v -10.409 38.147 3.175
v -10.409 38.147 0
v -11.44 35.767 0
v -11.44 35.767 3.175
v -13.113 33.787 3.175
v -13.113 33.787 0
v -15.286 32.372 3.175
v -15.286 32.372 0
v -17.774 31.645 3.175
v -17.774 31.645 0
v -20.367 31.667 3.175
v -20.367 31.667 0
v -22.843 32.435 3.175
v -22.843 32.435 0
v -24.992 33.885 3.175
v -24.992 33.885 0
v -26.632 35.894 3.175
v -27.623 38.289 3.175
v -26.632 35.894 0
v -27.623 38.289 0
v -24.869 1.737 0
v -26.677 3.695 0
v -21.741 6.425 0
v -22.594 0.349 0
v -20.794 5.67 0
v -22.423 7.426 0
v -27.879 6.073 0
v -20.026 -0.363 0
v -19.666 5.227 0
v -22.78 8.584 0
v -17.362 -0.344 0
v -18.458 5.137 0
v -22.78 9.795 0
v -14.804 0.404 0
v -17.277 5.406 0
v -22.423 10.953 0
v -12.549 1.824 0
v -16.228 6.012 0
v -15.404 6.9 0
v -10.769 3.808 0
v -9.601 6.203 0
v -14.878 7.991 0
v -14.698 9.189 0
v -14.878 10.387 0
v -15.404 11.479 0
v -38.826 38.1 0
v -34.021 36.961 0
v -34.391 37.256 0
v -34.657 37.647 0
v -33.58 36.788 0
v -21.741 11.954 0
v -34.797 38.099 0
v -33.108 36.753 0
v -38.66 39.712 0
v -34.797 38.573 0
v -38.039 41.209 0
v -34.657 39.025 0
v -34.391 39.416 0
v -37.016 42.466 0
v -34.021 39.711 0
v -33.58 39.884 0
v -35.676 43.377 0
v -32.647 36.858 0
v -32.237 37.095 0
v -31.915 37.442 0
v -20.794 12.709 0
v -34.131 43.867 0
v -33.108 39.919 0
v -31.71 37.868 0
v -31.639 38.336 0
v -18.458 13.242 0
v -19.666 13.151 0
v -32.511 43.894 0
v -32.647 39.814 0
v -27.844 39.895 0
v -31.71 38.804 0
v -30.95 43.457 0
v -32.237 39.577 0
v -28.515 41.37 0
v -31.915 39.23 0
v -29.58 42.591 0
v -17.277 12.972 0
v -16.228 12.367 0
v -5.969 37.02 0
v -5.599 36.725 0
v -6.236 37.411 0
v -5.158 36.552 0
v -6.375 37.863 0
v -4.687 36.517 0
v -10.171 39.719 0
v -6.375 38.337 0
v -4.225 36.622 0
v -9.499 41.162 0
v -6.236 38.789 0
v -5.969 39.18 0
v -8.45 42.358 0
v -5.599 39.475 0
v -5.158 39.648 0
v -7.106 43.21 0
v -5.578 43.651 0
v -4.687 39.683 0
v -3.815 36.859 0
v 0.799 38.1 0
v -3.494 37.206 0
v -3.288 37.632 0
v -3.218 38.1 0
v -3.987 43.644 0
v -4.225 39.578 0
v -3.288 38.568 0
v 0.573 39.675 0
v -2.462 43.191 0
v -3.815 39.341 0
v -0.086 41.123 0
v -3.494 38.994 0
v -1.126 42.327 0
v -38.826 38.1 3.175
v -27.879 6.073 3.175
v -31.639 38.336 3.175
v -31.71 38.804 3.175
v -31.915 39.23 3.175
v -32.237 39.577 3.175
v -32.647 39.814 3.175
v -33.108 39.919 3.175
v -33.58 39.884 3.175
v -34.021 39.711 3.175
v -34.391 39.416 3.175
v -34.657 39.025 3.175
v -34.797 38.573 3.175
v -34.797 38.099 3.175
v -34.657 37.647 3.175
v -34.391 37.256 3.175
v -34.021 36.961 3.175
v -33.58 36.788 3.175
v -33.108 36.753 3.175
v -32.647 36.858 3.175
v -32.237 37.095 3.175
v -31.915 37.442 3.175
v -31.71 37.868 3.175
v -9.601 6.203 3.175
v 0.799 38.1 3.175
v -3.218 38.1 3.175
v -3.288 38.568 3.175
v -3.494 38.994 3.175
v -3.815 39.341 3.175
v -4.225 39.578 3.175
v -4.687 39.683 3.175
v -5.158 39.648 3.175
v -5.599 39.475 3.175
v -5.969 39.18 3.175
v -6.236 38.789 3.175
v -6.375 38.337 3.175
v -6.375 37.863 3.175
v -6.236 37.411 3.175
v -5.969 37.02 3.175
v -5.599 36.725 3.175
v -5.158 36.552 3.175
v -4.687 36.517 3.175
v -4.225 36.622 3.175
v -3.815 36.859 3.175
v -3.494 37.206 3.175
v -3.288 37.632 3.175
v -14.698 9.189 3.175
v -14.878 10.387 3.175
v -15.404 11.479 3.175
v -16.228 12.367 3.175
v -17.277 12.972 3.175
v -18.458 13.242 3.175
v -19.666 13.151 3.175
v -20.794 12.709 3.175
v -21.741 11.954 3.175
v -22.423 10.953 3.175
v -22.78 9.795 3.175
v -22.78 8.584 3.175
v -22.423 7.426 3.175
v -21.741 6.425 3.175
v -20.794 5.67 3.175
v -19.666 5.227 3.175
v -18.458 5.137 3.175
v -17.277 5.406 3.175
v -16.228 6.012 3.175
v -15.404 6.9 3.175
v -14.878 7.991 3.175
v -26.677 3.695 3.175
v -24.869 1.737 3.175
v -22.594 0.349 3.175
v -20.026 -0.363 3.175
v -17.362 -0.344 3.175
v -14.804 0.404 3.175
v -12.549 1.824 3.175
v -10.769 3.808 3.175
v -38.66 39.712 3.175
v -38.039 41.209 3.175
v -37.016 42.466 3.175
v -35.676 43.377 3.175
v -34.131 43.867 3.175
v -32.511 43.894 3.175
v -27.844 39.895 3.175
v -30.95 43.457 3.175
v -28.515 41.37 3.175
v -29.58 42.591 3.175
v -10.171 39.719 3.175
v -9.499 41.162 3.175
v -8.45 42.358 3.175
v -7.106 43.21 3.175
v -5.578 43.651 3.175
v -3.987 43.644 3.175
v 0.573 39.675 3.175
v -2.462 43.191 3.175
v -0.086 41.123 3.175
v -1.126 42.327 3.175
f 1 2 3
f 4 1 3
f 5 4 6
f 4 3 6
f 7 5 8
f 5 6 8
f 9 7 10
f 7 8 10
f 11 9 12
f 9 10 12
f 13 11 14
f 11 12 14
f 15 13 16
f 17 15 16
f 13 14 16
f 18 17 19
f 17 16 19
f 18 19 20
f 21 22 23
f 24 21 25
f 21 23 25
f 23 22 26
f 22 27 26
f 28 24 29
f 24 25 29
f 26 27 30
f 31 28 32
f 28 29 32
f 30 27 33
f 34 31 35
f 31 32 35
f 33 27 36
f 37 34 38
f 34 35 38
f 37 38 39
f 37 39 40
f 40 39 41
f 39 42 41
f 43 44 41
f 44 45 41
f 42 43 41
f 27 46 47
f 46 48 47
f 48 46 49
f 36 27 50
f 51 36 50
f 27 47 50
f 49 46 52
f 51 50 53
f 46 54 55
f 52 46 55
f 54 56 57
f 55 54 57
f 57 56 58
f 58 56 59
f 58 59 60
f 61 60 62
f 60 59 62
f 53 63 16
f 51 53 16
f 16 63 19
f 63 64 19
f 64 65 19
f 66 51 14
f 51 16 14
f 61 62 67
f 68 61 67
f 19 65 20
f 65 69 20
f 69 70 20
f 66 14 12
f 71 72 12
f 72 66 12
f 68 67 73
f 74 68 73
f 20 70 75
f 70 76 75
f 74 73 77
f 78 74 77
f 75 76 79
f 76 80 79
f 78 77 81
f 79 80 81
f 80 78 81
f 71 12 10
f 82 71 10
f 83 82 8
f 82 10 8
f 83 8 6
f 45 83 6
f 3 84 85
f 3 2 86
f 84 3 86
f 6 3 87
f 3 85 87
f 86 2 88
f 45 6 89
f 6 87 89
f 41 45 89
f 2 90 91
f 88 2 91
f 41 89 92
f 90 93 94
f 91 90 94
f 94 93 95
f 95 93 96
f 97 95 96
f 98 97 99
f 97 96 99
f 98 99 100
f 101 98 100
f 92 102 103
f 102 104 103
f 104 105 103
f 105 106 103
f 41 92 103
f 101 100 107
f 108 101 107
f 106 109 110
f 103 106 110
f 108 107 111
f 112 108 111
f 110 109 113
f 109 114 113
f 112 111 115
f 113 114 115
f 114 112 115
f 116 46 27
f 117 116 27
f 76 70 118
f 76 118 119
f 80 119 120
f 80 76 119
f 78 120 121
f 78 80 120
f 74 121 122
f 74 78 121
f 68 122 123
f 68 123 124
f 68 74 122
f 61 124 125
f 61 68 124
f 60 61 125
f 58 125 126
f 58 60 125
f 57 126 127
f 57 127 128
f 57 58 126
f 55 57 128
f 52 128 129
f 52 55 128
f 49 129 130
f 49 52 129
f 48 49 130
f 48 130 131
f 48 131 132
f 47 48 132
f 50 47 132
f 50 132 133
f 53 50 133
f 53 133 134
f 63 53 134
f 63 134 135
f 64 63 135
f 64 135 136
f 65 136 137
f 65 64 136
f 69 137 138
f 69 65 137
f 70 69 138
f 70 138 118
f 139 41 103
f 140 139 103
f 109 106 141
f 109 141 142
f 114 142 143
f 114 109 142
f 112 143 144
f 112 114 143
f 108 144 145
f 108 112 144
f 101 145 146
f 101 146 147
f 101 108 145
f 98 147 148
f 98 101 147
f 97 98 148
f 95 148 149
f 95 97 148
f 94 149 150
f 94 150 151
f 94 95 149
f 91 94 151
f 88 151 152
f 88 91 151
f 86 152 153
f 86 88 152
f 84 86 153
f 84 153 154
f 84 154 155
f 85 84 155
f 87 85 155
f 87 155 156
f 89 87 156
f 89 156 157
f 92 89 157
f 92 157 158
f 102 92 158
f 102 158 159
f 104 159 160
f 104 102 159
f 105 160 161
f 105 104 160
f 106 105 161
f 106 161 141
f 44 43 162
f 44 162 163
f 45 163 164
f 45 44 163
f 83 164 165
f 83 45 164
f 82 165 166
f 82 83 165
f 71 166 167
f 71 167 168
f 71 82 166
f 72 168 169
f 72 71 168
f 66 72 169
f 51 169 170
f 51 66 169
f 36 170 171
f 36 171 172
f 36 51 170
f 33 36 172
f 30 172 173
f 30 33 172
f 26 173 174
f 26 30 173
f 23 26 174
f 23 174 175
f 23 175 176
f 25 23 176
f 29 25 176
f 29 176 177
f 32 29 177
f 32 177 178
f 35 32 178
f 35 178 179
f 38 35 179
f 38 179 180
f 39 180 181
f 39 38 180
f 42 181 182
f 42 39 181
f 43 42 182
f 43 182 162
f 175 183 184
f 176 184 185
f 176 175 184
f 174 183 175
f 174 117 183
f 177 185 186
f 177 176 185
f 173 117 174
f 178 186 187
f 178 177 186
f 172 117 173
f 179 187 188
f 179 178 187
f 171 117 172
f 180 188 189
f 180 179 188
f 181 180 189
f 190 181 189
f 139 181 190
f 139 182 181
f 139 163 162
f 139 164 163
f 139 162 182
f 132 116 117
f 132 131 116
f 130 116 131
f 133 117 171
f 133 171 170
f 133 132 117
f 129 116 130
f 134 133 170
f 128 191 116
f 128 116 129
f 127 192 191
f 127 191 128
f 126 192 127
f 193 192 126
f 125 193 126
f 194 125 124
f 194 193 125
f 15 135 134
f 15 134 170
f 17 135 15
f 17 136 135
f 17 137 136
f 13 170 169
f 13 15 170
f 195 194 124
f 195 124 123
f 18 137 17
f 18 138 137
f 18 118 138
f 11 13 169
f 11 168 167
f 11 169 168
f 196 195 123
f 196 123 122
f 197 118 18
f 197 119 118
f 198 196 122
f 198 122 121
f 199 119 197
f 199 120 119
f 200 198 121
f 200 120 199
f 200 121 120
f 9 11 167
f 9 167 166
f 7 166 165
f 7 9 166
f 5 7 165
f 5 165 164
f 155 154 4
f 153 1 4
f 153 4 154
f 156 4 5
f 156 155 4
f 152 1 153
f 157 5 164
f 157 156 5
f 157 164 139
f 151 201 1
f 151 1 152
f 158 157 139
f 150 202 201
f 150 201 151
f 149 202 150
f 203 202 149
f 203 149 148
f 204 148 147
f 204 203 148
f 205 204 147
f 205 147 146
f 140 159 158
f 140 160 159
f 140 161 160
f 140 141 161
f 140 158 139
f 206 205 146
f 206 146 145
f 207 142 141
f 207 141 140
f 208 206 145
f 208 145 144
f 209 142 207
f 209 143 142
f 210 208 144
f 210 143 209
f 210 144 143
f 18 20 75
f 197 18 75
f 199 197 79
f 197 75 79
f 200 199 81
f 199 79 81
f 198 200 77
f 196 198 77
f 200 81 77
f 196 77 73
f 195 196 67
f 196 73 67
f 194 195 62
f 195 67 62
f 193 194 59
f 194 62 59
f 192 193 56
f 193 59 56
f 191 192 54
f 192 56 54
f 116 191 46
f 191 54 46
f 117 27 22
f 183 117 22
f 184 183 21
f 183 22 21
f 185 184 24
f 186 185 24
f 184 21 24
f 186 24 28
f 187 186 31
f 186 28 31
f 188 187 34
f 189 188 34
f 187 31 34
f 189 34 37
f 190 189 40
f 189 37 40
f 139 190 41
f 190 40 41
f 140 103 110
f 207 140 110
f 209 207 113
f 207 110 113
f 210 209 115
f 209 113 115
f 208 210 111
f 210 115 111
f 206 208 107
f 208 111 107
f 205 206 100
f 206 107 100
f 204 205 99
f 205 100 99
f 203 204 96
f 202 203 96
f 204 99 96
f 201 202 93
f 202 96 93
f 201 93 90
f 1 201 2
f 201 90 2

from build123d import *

# Parameters (mm, degrees)
F0_R     = 4.064
F0_R_2   = 1.5875
F1_DEPTH = 3.175


with BuildPart() as f1:
    # F0 (on Top) → F1 (new body)
    with BuildSketch(Plane.XY):
        with BuildLine():
            ThreePointArc((-10.409411, 38.146532), (-19.071367, 31.560942), (-27.622774, 38.289456))
            ThreePointArc((-27.622774, 38.289456), (-33.321705, 43.939553), (-38.826343, 38.1))
            Line((-38.826343, 38.1), (-27.879121, 6.072861))
            ThreePointArc((-27.879121, 6.072861), (-18.693227, -0.445875), (-9.600745, 6.202533))
            ThreePointArc((-9.600745, 6.202533), (-9.600626, 6.2029), (-9.600506, 6.203266))
            Line((-9.600506, 6.203266), (0.799111, 38.1))
            ThreePointArc((0.799111, 38.1), (-4.781981, 43.704309), (-10.409411, 38.146532))
        make_face()
        with Locations((-18.761582, 9.189334)):
            Circle(F0_R, mode=Mode.SUBTRACT)
        with Locations((-33.226947, 38.335988)):
            Circle(F0_R_2, mode=Mode.SUBTRACT)
        with Locations((-4.805247, 38.1)):
            Circle(F0_R_2, mode=Mode.SUBTRACT)
    extrude(amount=F1_DEPTH)


solid = f1.part
